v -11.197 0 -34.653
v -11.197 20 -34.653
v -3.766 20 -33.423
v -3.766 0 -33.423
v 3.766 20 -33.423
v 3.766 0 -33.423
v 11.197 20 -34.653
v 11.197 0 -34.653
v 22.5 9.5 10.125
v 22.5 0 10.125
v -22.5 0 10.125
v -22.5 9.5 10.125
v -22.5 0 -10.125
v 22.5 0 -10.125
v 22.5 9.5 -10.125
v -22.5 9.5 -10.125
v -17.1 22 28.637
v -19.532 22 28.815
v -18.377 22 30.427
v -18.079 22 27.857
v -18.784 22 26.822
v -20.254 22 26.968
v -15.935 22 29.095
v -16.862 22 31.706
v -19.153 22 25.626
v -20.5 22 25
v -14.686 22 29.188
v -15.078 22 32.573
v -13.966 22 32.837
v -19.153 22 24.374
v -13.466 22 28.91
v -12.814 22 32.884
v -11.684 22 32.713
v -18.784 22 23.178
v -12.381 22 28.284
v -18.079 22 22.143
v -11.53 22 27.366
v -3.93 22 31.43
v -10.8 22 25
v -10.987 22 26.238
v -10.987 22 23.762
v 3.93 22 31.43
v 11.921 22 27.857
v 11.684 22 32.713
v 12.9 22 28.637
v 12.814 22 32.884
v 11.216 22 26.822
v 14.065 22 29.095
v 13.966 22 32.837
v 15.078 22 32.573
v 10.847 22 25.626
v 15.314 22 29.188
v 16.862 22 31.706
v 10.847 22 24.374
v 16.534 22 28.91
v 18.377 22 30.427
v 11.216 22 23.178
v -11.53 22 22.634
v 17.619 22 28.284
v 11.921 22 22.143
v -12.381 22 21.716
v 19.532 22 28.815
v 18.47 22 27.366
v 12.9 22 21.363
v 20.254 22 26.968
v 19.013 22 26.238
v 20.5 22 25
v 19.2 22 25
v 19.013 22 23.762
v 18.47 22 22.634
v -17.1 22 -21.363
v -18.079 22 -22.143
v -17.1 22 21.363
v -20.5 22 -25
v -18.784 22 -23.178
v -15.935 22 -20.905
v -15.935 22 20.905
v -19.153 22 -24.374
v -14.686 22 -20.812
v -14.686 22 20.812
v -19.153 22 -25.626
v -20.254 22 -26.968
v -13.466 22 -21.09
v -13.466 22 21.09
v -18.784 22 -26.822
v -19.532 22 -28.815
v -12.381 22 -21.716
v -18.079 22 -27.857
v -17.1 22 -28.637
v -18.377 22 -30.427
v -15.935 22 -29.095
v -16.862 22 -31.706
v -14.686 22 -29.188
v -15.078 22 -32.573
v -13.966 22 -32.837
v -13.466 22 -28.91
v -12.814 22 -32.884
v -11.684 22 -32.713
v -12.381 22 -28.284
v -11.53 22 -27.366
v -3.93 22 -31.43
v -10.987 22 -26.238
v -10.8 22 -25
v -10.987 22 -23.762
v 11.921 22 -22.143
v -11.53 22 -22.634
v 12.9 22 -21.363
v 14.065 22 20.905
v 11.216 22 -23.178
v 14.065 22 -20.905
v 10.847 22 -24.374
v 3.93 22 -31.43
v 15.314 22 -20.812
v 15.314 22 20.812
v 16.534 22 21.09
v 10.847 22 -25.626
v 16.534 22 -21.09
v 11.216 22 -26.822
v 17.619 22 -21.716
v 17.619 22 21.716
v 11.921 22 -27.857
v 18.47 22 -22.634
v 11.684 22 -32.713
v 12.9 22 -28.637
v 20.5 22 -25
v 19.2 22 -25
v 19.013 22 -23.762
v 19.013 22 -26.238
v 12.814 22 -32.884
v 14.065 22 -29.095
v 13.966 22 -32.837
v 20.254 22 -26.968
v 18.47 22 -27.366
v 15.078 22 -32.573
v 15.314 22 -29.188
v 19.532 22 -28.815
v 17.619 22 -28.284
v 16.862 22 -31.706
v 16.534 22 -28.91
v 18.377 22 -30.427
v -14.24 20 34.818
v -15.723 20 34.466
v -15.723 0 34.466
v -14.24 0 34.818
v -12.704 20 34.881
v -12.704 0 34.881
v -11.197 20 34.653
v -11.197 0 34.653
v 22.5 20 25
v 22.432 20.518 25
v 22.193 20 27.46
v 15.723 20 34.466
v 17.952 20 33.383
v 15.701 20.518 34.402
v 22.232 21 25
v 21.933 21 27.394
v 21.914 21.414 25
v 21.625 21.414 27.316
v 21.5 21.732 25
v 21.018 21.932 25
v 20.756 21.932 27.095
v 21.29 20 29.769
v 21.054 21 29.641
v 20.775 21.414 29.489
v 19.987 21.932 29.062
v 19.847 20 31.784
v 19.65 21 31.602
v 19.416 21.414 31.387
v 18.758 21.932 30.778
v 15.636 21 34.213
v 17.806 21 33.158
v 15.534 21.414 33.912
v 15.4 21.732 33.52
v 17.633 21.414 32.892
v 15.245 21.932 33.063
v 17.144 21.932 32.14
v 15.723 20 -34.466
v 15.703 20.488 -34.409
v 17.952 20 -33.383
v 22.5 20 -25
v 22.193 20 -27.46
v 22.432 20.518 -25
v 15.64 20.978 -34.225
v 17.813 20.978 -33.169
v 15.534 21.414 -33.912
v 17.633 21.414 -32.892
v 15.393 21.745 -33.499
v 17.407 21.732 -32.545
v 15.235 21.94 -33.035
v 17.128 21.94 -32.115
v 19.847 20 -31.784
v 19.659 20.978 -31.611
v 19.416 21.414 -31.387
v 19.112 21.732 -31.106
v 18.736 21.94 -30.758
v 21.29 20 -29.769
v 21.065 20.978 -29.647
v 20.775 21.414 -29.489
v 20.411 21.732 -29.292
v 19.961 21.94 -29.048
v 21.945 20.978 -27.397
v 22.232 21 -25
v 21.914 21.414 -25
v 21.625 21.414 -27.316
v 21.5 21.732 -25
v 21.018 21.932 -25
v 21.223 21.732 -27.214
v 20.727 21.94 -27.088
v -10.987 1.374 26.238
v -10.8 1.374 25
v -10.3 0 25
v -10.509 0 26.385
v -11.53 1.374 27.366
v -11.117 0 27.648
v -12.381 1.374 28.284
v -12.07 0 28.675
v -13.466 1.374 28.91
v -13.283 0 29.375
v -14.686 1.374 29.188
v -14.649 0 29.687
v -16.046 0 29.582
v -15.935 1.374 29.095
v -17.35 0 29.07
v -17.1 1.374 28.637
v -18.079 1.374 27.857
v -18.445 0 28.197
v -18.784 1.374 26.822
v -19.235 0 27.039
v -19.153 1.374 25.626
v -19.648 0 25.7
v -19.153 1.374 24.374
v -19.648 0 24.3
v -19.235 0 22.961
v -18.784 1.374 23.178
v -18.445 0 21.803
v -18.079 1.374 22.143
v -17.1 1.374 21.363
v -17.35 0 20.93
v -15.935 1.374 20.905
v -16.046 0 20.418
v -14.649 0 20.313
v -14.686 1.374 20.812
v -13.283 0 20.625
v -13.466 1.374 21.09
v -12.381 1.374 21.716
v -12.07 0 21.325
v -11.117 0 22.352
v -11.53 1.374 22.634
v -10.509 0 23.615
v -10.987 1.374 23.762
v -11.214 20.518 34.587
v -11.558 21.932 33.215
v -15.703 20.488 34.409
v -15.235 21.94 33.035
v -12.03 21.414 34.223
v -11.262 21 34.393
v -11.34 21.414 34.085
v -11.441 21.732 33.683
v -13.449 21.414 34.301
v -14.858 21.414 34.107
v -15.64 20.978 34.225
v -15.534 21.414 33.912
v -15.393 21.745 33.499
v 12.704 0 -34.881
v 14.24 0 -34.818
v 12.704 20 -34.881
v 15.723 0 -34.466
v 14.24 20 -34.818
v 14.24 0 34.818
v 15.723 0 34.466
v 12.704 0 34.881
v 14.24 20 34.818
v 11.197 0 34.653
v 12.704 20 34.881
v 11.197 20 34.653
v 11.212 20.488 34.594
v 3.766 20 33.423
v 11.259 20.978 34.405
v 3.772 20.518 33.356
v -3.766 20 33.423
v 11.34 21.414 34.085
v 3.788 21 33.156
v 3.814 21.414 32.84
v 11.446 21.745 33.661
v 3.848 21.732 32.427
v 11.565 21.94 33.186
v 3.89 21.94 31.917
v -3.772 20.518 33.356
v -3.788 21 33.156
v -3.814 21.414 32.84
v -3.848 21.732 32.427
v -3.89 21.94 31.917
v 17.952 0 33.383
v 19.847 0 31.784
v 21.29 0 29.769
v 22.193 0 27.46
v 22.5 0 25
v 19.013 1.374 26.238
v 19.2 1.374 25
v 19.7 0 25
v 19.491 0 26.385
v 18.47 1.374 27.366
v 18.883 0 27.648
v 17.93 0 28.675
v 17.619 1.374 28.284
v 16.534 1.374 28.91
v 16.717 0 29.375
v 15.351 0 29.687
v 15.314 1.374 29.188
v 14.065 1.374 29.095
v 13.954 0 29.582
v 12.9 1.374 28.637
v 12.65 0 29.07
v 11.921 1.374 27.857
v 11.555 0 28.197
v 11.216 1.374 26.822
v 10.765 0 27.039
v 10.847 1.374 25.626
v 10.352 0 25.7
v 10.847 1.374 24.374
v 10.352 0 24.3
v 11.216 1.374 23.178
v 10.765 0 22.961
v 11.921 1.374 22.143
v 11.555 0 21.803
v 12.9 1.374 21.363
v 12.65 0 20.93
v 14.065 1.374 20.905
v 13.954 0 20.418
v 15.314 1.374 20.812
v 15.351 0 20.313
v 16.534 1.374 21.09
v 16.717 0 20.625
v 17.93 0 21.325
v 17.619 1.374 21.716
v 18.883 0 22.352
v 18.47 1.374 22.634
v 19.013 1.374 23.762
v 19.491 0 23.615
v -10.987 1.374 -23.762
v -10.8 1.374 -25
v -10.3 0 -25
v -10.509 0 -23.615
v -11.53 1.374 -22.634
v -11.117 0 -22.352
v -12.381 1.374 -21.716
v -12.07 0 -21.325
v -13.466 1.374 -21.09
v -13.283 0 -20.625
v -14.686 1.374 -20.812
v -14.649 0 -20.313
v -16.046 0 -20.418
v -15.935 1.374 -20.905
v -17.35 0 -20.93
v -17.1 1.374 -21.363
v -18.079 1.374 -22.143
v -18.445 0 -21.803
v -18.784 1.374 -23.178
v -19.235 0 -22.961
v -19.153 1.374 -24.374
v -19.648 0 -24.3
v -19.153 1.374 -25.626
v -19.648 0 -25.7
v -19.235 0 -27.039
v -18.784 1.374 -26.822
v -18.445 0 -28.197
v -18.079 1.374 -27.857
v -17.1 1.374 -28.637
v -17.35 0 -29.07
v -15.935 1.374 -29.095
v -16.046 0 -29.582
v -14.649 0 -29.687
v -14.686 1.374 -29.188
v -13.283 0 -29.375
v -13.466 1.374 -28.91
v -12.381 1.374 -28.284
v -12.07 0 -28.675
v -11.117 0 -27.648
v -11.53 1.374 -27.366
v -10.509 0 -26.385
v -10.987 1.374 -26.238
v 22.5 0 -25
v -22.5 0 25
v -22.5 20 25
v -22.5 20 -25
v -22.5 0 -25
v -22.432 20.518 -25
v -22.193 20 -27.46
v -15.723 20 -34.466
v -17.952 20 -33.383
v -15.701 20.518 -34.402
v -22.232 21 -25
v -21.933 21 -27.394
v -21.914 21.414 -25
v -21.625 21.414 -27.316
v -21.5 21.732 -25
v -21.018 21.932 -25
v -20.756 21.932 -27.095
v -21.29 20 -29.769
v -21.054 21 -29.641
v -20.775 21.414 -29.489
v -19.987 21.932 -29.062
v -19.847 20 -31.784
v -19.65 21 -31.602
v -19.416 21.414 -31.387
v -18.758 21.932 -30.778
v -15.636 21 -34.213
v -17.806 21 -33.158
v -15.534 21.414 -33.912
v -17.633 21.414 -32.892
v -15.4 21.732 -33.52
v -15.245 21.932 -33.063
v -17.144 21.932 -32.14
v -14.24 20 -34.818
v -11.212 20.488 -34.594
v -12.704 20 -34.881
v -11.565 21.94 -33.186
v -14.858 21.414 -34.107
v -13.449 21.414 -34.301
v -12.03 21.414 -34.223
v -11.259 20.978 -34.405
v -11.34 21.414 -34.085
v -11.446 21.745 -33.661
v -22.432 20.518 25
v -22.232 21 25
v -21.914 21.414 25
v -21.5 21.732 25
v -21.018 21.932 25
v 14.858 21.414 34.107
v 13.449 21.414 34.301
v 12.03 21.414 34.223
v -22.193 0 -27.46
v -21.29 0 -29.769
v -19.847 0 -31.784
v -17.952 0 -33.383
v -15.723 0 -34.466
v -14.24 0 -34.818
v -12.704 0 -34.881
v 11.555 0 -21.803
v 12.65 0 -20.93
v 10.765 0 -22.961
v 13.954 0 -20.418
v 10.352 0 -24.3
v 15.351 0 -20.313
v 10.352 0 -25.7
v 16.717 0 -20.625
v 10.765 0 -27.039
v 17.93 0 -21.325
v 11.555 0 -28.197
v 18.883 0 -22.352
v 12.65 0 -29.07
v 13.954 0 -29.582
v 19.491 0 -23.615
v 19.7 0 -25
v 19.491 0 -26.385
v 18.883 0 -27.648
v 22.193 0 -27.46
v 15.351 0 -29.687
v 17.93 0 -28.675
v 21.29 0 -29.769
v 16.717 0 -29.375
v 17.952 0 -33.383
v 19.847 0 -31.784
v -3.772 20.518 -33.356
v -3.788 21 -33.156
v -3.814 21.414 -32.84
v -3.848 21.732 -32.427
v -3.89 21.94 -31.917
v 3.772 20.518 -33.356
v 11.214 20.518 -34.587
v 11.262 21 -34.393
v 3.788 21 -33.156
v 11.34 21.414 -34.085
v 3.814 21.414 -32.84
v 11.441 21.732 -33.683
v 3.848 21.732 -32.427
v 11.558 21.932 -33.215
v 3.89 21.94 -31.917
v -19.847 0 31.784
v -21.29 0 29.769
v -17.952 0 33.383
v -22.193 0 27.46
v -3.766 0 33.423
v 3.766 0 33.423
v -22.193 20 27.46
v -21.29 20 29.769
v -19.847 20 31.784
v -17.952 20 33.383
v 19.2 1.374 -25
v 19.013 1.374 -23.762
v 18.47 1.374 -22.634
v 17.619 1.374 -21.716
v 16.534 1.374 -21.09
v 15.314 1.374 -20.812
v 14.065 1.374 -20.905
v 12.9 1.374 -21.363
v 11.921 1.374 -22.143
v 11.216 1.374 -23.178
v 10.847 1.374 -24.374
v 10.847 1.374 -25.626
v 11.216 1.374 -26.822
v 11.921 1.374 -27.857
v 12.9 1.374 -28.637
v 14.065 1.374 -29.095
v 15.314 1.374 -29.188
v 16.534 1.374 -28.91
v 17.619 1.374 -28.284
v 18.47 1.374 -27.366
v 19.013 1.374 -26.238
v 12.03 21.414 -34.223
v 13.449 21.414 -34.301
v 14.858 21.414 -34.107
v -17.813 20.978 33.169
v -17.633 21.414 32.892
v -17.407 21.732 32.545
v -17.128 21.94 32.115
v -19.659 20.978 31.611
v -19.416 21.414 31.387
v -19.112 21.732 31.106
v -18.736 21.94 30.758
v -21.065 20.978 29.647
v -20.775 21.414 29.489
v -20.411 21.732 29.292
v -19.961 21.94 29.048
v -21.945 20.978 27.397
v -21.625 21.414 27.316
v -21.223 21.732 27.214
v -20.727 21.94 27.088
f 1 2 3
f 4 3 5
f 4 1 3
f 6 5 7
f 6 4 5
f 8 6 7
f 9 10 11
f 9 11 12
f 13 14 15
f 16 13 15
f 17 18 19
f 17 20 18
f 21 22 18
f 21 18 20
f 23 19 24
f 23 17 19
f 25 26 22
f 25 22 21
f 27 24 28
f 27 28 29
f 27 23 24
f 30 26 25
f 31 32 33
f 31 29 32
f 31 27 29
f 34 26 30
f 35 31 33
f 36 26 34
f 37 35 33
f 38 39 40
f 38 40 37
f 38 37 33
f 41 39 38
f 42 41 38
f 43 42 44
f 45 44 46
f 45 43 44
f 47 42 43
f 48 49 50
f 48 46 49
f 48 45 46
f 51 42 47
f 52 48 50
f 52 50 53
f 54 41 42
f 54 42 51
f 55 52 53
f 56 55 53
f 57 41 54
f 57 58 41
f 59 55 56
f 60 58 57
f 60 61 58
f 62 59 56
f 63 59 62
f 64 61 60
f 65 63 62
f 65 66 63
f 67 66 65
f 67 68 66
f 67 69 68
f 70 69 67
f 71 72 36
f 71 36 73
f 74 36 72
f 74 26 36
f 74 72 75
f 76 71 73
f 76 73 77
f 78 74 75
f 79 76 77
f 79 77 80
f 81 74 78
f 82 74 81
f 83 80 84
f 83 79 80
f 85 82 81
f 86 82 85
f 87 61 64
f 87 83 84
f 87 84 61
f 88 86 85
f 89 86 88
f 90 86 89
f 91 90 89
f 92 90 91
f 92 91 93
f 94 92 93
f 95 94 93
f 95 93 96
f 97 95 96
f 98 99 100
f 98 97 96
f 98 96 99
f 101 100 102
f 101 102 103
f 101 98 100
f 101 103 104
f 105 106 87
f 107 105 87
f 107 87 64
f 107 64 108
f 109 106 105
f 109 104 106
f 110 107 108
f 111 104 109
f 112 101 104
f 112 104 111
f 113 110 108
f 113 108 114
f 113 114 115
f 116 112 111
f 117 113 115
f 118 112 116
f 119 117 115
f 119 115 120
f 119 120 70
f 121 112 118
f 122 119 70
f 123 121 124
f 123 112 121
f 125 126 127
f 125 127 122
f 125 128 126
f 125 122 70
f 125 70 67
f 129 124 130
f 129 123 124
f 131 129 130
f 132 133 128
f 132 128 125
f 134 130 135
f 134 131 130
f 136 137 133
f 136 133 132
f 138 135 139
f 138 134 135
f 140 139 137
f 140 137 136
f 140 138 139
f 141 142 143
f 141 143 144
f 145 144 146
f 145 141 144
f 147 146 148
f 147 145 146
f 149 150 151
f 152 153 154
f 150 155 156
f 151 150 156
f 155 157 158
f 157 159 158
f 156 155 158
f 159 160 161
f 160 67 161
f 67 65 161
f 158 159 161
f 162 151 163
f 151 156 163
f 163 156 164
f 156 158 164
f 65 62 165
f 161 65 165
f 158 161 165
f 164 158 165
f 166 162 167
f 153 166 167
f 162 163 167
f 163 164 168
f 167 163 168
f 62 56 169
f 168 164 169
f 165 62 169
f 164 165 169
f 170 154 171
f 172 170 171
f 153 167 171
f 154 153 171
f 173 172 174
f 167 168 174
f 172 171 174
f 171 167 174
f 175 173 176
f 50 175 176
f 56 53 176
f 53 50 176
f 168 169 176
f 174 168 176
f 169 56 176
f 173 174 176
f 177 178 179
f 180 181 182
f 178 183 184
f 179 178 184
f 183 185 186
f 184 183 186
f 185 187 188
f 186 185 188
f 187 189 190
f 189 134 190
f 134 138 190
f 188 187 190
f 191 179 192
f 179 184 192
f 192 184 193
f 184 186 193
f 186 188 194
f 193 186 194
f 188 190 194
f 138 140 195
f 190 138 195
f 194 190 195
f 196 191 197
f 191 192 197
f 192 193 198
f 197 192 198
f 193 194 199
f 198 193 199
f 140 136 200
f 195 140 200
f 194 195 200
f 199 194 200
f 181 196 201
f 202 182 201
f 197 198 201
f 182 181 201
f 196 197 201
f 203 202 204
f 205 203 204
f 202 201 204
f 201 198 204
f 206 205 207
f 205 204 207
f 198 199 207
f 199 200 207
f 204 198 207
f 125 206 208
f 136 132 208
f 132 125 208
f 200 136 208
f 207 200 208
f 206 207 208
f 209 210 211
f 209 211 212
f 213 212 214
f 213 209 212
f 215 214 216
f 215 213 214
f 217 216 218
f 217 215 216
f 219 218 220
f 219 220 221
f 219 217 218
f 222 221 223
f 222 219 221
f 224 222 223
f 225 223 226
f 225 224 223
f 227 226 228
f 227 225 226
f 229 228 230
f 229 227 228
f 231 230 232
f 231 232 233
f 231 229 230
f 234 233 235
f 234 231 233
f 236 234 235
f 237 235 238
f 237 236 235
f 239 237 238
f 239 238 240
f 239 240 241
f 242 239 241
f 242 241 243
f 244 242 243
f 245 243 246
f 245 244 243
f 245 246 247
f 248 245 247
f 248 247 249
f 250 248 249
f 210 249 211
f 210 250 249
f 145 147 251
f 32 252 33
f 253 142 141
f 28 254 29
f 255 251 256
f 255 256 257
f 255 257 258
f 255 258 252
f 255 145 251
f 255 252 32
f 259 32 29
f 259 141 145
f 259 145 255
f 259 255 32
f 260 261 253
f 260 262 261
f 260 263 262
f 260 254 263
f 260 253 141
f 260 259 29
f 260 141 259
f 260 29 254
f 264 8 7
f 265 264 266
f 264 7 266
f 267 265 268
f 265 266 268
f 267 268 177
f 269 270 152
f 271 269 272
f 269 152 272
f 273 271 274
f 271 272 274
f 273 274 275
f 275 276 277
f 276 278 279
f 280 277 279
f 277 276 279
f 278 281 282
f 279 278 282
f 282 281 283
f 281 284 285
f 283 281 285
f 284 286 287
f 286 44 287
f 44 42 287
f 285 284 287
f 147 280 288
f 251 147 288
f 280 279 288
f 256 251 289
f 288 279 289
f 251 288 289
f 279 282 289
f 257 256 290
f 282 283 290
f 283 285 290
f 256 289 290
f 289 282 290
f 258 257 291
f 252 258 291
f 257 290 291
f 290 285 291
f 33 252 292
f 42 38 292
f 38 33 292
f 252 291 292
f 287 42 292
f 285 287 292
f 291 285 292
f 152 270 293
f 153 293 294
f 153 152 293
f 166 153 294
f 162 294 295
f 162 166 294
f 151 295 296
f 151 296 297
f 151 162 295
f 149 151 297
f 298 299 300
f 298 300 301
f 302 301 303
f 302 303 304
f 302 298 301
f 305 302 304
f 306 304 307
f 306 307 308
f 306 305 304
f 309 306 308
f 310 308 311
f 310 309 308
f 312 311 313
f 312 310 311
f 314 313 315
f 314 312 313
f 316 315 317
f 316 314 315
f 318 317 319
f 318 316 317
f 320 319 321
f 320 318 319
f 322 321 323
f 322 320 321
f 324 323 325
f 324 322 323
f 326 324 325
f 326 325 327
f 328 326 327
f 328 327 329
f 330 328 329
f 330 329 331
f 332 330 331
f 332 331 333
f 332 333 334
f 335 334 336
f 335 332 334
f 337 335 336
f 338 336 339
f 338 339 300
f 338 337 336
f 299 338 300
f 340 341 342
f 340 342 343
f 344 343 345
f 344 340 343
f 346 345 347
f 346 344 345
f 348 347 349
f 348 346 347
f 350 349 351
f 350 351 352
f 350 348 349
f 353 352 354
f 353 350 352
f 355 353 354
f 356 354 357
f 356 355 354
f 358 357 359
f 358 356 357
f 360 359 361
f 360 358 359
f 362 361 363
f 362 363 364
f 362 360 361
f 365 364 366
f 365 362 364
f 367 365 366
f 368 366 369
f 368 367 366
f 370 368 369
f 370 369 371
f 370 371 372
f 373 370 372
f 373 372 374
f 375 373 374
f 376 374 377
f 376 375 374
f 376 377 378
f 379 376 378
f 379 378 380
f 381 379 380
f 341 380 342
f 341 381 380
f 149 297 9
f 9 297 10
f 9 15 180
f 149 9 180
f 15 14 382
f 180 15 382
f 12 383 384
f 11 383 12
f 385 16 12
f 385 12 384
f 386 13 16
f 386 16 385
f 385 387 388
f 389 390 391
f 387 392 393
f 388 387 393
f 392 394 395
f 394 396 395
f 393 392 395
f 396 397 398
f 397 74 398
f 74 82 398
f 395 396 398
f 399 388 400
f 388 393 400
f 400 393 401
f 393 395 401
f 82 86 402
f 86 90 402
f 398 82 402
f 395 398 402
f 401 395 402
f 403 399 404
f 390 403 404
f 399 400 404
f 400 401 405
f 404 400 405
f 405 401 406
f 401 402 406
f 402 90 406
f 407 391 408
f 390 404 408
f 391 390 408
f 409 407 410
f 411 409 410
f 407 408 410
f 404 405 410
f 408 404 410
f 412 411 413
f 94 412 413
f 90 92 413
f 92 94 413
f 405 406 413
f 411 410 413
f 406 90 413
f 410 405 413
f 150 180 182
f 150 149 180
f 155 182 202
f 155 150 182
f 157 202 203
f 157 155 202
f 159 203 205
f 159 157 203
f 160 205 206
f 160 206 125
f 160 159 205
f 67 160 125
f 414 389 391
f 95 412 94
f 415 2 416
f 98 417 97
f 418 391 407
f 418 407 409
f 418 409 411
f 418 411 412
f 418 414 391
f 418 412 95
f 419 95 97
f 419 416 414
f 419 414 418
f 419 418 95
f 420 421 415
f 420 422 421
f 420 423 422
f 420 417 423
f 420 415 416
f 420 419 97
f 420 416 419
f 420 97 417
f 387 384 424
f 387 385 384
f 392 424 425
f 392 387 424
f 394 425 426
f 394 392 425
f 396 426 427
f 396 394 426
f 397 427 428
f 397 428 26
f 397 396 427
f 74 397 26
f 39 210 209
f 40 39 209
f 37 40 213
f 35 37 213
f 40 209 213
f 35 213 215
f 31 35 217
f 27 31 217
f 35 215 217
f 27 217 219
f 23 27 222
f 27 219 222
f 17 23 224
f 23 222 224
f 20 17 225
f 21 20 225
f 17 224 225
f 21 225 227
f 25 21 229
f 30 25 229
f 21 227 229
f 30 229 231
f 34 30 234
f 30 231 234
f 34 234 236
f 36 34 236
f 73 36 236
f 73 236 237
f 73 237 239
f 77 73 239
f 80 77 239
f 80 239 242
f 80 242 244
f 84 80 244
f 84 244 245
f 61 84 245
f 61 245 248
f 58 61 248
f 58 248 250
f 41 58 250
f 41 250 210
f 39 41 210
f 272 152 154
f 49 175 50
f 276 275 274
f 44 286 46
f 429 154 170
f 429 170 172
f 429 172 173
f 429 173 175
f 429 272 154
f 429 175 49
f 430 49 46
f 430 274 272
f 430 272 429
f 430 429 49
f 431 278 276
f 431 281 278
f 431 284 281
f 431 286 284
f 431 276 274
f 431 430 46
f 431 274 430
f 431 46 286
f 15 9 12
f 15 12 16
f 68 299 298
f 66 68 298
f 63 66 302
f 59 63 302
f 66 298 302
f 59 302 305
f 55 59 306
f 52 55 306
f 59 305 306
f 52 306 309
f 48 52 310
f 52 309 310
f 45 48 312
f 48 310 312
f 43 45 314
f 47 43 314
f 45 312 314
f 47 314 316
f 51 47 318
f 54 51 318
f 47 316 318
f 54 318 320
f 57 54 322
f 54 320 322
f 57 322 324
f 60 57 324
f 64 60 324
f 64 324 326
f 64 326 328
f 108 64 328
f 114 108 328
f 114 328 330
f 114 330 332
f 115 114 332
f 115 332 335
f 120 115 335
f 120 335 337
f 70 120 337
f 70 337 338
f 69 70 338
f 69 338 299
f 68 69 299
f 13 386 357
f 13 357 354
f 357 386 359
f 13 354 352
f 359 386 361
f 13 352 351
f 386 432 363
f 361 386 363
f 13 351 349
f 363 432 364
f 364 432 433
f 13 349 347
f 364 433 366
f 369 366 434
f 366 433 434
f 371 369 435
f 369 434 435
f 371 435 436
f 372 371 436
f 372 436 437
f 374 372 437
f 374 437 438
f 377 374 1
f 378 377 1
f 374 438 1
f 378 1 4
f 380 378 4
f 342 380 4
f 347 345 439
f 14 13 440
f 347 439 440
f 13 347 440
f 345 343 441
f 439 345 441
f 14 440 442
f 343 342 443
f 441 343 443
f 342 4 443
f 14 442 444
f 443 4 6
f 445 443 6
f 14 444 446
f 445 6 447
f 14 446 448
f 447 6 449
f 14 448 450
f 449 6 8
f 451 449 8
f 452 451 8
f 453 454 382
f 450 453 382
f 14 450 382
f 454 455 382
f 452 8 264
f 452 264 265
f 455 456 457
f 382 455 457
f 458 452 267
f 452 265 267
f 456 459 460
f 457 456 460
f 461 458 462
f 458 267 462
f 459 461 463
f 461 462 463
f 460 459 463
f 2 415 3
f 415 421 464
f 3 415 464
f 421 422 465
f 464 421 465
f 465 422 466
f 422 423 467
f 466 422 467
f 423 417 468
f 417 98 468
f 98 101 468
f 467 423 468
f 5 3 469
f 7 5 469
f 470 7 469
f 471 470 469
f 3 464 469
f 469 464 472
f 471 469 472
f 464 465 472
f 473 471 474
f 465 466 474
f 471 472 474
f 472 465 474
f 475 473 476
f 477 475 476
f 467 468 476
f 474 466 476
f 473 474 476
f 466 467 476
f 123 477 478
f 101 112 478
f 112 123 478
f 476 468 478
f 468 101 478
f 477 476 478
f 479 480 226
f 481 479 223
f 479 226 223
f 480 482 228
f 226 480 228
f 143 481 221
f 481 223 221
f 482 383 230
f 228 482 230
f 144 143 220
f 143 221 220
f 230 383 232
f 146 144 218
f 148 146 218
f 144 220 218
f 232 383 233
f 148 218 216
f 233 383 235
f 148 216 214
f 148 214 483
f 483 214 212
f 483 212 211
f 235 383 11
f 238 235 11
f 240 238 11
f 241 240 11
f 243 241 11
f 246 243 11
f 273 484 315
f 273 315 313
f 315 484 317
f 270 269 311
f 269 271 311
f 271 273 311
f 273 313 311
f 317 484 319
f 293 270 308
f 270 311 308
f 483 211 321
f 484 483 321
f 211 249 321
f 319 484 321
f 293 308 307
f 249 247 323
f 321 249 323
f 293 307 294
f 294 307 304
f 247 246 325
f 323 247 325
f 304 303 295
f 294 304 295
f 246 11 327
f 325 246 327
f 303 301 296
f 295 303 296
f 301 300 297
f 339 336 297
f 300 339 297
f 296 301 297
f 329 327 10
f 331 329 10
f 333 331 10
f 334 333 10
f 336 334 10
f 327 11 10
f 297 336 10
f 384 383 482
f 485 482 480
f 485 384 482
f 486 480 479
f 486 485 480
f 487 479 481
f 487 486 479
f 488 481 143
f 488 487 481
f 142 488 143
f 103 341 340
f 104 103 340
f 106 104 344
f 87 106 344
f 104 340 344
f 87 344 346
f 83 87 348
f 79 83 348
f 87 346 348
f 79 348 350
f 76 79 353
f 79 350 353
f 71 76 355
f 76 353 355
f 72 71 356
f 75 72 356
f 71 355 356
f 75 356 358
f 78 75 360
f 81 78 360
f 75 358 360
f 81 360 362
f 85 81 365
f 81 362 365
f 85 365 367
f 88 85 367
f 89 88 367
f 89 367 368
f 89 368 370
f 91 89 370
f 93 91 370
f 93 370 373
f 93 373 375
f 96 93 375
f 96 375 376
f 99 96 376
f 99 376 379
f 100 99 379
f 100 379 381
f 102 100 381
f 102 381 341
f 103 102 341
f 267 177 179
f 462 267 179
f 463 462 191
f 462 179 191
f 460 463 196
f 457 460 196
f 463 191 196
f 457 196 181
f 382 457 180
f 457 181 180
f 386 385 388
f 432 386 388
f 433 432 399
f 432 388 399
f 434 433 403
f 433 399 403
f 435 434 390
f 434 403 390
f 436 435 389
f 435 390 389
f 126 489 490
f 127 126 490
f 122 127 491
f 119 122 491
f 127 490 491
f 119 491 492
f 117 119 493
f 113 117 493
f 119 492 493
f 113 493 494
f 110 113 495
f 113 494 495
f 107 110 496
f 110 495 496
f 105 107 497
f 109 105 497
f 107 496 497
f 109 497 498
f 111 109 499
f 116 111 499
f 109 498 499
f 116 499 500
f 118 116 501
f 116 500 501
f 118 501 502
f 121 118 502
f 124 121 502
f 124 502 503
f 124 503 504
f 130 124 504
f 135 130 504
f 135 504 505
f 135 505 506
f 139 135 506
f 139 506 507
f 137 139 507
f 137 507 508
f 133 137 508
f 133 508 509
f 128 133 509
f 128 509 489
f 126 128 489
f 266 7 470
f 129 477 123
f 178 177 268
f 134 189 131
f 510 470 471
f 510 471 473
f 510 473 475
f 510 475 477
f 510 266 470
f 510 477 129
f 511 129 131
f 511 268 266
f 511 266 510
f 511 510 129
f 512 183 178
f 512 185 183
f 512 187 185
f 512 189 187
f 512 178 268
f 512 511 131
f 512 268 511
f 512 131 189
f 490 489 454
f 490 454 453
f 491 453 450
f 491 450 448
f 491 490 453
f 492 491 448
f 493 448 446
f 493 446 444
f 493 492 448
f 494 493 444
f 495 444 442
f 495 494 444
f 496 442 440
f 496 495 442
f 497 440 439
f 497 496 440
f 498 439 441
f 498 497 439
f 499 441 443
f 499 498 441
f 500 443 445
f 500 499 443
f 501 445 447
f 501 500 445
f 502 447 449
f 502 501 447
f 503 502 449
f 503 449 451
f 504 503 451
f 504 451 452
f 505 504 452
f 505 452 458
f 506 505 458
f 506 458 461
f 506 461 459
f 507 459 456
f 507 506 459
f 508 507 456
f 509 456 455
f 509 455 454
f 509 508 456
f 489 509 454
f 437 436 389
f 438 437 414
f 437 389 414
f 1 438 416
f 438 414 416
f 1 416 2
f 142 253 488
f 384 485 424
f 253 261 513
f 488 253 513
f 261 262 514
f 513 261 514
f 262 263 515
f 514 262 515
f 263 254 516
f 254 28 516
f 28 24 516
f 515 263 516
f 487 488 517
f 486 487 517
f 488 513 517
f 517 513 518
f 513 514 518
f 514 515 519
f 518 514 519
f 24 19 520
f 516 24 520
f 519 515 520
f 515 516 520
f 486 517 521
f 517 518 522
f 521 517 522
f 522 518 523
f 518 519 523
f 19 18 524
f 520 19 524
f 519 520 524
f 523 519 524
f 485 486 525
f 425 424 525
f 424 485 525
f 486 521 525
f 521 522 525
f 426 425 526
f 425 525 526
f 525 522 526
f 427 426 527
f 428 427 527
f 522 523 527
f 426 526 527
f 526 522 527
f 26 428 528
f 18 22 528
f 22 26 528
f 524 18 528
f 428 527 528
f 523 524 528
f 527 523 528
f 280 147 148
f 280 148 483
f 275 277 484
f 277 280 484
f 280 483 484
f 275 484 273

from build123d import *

# Parameters (mm, degrees)
SKETCH1_W               = 45
SKETCH1_H               = 70
BOSS_EXTRUDE1_DEPTH     = 22
SKETCH2_W               = 20.25
SKETCH2_H               = 9.5
CUT_EXTRUDE1_DEPTH      = 1
CUT_EXTRUDE1_DEPTH_BACK = 46
SKETCH3_R               = 4.2
CUT_EXTRUDE2_DEPTH      = 23
FILLET1_R               = 10
CUT_EXTRUDE3_DEPTH      = 23
FILLET2_R               = 8
FILLET4_R               = 2
CHAMFER1_SIZE           = 0.5
CHAMFER1_SIZE2          = 1.37373871
CHAMFER1_PART_2_SIZE    = 0.5
CHAMFER1_PART_2_SIZE2   = 1.37373871


with BuildPart() as part:
    # Sketch1 → Boss-Extrude1 (new body)
    with BuildSketch(Plane(origin=(0, 0, 0), x_dir=(1, 0, 0), z_dir=(0, 1, 0))):
        Rectangle(SKETCH1_W, SKETCH1_H)
    extrude(amount=BOSS_EXTRUDE1_DEPTH)

    # Sketch2 → Cut-Extrude1 (cut, two sides)
    with BuildSketch(Plane(origin=(22.5, 0, 0), x_dir=(0, 0, -1), z_dir=(1, 0, 0))) as cut_extrude1_sk:
        with Locations((0, 4.75)):
            Rectangle(SKETCH2_W, SKETCH2_H)
    extrude(amount=CUT_EXTRUDE1_DEPTH, mode=Mode.SUBTRACT)
    extrude(cut_extrude1_sk.sketch, amount=-CUT_EXTRUDE1_DEPTH_BACK, mode=Mode.SUBTRACT)

    # Sketch3 → Cut-Extrude2 (cut, through all)
    with BuildSketch(Plane.XZ):
        with Locations((15, 25)):
            Circle(SKETCH3_R)
        with Locations((15, -25)):
            Circle(SKETCH3_R)
        with Locations((-15, -25)):
            Circle(SKETCH3_R)
        with Locations((-15, 25)):
            Circle(SKETCH3_R)
    extrude(amount=-CUT_EXTRUDE2_DEPTH, mode=Mode.SUBTRACT)

    # Fillet1
    fillet1_edges = [part.edges().sort_by_distance(p)[0] for p in [
        (-22.5, 11, -35),
        (22.5, 11, -35),
        (22.5, 11, 35),
        (-22.5, 11, 35),
    ]]
    fillet(fillet1_edges, radius=FILLET1_R)

    # Sketch6 → Cut-Extrude3 (cut, through all)
    with BuildSketch(Plane.XZ):
        with BuildLine():
            Line((12.5, 35), (-12.5, 35))
            ThreePointArc((-12.5, 35), (0, 33.26906369), (12.5, 35))
        make_face()
        with BuildLine():
            Line((12.5, -35), (-12.5, -35))
            ThreePointArc((-12.5, -35), (0, -33.26906369), (12.5, -35))
        make_face()
    extrude(amount=-CUT_EXTRUDE3_DEPTH, mode=Mode.SUBTRACT)

    # Fillet2
    fillet2_edges = [part.edges().sort_by_distance(p)[0] for p in [
        (12.5, 11, 35),
        (-12.5, 11, 35),
        (12.5, 11, -35),
        (-12.5, 11, -35),
    ]]
    fillet(fillet2_edges, radius=FILLET2_R)

    # Fillet4
    fillet4_edges = [part.edges().sort_by_distance(p)[0] for p in [
        (-22.5, 22, 0),
        (22.5, 22, 0),
        (20.63102045, 22, -30.821211768),
        (-20.63102045, 22, 30.821211768),
        (0, 22, 33.26906369),
        (20.63102045, 22, 30.821211768),
        (0, 22, -33.26906369),
        (-20.63102045, 22, -30.821211768),
        (13.473401565, 22, -34.886533438),
        (-13.473401565, 22, -34.886533438),
        (-13.473401565, 22, 34.886533438),
        (13.473401565, 22, 34.886533438),
    ]]
    fillet(fillet4_edges, radius=FILLET4_R)

    # Chamfer1
    chamfer1_edges = [part.edges().sort_by_distance(p)[0] for p in [
        (-19.2, 0, -25),
        (10.8, 0, -25),
    ]]
    chamfer1_side = [part.faces().sort_by_distance(p)[0] for p in [
        (0, 0, -21.437561791),
    ]]
    chamfer(chamfer1_edges, length=CHAMFER1_SIZE, length2=CHAMFER1_SIZE2, reference=chamfer1_side[0])

    # Chamfer1 part 2
    chamfer1_part_2_edges = [part.edges().sort_by_distance(p)[0] for p in [
        (-19.2, 0, 25),
        (10.8, 0, 25),
    ]]
    chamfer1_part_2_side = [part.faces().sort_by_distance(p)[0] for p in [
        (0, 0, 21.437561791),
    ]]
    chamfer(chamfer1_part_2_edges, length=CHAMFER1_PART_2_SIZE, length2=CHAMFER1_PART_2_SIZE2, reference=chamfer1_part_2_side[0])


solid = part.part
